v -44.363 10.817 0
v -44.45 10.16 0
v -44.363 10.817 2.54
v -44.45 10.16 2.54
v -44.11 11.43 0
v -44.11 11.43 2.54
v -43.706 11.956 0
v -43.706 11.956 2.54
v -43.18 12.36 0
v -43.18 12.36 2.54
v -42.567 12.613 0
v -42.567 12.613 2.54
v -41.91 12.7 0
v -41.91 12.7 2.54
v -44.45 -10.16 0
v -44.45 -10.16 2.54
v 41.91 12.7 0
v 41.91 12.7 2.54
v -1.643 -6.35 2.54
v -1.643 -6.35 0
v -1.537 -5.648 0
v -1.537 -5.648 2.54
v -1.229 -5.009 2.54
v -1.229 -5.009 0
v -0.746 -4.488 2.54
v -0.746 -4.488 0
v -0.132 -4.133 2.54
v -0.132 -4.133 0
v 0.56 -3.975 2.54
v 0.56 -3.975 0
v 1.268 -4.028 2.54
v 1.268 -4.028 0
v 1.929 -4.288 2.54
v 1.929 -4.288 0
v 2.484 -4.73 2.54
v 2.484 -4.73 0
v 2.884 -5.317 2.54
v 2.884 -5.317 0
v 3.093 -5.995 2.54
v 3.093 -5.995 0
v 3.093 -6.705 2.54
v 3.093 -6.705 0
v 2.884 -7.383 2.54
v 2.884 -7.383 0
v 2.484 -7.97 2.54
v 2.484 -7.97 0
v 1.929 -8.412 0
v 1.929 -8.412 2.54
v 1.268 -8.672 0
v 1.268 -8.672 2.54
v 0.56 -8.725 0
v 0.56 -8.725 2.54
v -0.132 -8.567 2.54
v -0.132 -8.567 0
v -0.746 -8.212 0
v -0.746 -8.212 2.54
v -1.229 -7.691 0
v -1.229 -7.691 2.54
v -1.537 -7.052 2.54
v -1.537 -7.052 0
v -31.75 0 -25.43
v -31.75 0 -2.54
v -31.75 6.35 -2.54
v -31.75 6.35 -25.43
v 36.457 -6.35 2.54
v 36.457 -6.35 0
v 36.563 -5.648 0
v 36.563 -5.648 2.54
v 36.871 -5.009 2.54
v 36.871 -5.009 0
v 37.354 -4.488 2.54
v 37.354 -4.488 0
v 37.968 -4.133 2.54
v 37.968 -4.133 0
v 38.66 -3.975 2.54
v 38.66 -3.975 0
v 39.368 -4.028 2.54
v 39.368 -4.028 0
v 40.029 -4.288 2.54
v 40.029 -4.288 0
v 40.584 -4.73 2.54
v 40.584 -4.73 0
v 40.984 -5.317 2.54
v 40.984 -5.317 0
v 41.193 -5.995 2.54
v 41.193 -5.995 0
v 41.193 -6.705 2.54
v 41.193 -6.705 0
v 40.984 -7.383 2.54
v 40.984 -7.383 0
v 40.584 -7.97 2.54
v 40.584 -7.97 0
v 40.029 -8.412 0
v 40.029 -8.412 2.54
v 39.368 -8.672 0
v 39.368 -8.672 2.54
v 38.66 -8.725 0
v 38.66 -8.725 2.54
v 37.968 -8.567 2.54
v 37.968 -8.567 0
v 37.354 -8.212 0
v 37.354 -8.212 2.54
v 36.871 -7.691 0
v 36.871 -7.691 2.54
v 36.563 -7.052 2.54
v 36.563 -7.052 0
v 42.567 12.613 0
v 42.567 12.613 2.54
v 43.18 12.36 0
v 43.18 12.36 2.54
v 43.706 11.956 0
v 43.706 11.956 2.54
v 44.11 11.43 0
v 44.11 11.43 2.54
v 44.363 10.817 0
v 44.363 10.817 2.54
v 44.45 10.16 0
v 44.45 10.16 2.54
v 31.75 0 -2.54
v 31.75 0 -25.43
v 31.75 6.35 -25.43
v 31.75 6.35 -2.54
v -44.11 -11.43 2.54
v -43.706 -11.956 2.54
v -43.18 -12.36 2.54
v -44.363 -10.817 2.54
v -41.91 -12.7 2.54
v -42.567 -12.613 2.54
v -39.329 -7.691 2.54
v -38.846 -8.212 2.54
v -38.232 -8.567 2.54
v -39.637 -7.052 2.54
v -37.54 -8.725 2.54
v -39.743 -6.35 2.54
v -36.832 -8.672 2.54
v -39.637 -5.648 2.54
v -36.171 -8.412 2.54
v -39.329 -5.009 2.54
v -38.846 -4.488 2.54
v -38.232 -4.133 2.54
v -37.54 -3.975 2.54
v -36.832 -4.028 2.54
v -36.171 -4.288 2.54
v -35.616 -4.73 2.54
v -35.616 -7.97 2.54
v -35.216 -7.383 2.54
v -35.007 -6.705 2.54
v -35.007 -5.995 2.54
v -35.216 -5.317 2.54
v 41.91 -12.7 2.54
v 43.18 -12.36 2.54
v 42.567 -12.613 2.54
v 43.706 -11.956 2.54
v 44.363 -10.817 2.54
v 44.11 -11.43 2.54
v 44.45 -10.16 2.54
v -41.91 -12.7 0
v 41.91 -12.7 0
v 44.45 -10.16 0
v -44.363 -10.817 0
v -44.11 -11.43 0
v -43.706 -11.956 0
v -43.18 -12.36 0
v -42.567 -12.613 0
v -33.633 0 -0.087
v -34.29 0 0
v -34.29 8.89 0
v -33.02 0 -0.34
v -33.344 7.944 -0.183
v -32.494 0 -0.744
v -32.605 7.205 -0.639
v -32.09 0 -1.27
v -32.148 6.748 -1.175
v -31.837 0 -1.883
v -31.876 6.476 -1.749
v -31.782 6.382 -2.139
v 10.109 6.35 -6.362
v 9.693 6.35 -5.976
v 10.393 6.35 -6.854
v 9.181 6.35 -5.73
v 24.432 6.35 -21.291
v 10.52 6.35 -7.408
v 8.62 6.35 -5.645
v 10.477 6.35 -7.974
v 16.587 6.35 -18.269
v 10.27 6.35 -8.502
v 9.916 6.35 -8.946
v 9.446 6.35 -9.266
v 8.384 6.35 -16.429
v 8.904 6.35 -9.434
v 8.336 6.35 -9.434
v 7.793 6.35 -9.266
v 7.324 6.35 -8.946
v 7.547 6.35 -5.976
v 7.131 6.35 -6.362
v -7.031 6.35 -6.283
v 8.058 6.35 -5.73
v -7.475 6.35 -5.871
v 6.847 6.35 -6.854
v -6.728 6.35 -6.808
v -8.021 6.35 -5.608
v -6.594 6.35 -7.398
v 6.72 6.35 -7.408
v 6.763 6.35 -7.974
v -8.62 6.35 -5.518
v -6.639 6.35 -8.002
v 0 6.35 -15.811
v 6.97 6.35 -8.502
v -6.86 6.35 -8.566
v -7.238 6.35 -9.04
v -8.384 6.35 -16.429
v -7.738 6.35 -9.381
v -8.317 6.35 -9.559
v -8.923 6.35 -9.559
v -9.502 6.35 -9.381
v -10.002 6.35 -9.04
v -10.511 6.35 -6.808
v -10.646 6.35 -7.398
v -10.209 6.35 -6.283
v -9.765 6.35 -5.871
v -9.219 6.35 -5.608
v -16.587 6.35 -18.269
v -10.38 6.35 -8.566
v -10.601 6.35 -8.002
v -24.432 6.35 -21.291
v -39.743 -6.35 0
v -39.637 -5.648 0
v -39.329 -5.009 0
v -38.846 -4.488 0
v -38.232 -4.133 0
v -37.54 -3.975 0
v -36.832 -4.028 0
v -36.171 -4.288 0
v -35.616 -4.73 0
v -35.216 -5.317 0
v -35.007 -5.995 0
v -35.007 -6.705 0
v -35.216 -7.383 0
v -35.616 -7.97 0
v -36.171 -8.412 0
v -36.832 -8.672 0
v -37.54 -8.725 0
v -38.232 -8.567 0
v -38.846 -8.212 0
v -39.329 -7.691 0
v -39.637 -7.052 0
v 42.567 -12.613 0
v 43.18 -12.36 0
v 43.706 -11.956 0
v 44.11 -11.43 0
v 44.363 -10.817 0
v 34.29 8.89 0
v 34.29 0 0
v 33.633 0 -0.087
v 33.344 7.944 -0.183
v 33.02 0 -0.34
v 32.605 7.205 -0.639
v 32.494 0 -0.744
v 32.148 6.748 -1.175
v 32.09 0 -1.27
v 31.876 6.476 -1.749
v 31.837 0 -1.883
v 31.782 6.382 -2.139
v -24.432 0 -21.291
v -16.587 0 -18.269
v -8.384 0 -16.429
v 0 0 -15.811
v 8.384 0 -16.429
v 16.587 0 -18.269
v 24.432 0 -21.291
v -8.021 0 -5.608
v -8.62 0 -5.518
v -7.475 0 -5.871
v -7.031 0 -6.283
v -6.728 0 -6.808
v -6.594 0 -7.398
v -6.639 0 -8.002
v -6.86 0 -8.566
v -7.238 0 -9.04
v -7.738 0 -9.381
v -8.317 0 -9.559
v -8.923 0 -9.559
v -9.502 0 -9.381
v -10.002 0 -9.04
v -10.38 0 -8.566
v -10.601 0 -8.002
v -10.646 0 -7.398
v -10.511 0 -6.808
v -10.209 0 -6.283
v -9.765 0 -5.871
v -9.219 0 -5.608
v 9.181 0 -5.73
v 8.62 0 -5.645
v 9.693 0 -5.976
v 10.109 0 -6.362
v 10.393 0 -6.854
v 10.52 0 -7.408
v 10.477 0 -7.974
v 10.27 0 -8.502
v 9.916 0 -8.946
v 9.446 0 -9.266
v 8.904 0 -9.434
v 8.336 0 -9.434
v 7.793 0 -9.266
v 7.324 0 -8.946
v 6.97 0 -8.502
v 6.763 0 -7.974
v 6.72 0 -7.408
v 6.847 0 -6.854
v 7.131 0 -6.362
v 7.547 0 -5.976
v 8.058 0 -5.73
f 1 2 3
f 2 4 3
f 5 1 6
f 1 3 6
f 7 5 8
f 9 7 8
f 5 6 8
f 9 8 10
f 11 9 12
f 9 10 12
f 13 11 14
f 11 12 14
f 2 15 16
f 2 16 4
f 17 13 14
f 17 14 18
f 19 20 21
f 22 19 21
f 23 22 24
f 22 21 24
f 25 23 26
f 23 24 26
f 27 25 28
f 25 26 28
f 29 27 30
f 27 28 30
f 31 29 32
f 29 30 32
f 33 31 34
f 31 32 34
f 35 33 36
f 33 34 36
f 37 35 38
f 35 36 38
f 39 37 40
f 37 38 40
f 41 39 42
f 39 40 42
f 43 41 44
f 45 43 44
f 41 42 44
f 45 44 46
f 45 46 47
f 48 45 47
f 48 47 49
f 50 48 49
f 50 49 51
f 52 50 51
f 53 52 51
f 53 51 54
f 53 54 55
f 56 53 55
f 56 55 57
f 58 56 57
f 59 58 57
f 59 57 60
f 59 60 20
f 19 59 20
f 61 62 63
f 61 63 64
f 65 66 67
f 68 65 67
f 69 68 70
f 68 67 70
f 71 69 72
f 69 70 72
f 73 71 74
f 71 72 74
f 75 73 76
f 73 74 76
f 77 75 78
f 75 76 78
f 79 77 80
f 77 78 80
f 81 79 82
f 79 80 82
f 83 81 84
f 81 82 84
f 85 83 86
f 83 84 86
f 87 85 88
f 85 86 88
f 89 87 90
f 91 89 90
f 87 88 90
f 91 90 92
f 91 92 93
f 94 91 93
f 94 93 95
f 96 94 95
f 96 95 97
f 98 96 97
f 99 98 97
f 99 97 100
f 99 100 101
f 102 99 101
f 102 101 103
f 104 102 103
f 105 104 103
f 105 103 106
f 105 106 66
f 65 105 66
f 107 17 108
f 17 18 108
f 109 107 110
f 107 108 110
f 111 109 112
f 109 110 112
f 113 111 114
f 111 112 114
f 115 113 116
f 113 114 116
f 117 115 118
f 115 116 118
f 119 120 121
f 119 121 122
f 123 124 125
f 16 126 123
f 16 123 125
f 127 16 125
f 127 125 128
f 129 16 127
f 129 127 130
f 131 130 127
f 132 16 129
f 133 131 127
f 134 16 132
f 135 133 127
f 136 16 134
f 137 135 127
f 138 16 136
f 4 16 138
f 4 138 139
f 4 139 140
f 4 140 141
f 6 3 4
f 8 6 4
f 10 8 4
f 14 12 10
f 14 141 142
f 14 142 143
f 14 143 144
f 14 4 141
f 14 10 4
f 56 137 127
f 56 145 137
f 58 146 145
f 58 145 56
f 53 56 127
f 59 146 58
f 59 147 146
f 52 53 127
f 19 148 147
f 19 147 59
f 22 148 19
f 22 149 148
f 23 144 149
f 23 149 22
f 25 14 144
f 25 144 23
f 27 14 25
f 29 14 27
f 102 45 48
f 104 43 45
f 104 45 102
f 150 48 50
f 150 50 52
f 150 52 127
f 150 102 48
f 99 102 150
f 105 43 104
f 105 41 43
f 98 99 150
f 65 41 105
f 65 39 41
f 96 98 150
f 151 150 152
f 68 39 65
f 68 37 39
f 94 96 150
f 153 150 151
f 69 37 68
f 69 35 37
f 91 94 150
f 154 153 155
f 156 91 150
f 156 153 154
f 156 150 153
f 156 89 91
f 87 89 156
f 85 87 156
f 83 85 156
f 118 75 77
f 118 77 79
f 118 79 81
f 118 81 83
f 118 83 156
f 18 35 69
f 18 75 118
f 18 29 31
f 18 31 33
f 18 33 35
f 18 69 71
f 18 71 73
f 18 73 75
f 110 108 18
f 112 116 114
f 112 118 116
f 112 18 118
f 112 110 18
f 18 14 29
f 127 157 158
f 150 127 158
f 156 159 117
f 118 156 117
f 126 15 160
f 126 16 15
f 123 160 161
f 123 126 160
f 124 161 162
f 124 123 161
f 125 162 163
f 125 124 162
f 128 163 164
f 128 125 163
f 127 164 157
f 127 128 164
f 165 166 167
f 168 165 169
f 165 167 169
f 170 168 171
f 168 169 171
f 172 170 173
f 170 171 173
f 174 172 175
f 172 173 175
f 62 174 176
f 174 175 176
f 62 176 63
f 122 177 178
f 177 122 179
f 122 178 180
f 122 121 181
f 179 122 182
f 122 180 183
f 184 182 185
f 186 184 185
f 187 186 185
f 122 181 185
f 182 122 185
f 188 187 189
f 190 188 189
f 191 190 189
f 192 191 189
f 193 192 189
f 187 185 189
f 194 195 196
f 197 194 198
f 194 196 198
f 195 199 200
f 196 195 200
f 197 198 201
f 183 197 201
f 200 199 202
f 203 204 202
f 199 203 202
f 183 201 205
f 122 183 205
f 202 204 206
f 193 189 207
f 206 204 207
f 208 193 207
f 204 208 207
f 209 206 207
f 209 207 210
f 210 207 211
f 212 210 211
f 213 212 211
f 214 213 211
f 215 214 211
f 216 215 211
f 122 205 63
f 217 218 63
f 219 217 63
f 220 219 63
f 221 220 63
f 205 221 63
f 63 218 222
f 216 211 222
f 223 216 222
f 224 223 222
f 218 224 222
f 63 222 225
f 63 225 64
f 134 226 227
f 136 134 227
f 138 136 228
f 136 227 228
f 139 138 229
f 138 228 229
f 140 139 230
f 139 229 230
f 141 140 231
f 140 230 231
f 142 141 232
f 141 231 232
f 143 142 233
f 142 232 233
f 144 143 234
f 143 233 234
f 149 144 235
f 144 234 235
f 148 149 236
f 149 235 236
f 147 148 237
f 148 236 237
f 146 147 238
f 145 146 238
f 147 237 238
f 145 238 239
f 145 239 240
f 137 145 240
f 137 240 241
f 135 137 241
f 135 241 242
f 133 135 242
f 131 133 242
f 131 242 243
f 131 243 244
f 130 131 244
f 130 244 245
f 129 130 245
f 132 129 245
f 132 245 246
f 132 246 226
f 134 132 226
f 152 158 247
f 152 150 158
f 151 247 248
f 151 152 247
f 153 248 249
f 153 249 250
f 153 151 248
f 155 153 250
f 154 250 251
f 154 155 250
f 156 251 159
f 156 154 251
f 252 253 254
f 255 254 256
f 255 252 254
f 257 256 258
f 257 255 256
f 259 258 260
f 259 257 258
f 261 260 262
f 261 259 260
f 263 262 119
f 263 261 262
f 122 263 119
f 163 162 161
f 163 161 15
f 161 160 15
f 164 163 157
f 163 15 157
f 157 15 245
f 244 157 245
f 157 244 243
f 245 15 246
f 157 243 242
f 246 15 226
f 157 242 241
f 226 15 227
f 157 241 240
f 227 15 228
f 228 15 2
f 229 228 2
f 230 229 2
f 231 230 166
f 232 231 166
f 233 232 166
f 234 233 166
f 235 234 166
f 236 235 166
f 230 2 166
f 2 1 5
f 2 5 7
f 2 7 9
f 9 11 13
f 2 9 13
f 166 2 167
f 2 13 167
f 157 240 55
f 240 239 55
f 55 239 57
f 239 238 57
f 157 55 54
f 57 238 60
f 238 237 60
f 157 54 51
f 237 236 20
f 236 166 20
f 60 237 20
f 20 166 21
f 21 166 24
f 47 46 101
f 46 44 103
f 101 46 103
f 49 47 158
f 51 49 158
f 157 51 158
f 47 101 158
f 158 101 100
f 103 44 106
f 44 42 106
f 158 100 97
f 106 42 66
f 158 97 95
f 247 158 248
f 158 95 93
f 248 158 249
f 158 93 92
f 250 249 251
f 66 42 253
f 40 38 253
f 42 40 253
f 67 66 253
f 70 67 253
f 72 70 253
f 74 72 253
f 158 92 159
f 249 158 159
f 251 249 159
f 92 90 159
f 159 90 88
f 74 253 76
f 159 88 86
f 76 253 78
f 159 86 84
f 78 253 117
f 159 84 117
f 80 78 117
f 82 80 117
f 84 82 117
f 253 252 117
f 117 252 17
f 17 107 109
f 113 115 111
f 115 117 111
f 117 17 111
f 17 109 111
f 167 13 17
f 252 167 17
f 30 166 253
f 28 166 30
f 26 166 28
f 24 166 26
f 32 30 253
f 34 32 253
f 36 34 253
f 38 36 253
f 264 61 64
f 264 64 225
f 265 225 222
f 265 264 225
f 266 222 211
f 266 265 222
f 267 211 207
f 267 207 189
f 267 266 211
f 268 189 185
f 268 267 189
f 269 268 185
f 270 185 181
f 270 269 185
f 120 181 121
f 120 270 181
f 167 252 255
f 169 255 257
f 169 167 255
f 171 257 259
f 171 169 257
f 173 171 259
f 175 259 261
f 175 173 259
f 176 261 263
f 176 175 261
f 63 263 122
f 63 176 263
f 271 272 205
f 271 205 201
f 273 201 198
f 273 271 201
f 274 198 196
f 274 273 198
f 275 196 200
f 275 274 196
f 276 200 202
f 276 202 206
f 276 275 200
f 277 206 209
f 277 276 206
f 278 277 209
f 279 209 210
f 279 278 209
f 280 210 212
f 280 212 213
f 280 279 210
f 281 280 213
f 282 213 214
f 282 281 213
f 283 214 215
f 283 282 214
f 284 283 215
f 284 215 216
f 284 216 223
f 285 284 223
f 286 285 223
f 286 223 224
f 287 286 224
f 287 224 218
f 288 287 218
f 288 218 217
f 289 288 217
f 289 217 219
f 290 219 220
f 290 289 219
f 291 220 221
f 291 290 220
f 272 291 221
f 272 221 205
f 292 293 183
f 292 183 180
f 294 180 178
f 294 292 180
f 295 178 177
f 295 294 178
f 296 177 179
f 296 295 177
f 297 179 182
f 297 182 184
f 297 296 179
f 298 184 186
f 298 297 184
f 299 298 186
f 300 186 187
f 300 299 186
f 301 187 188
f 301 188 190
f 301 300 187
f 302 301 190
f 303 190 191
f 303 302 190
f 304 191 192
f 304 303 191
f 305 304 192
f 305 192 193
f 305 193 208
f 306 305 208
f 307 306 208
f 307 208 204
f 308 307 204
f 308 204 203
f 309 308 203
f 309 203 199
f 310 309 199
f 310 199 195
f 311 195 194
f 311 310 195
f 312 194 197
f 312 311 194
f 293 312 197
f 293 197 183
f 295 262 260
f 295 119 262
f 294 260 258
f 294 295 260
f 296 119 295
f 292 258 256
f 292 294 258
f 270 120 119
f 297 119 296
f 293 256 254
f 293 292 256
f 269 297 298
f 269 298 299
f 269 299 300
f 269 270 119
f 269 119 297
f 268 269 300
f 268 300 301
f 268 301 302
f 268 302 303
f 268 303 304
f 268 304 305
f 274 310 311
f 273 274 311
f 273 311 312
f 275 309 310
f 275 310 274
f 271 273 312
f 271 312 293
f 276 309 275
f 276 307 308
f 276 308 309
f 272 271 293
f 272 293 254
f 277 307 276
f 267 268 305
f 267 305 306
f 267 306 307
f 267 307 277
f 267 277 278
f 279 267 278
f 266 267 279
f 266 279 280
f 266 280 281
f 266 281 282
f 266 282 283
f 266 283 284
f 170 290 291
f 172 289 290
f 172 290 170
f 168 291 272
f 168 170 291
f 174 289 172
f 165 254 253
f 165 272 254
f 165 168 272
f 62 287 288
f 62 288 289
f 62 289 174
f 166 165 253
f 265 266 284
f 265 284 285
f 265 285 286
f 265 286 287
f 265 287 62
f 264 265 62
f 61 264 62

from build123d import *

# Parameters (mm, degrees)
SKETCH1_W           = 88.9
SKETCH1_H           = 25.4
BOSS_EXTRUDE1_DEPTH = 2.54
SKETCH2_R           = 2.032
SKETCH2_R_2         = 1.905
BOSS_EXTRUDE2_DEPTH = 6.35
SKETCH3_R           = 2.38125
CUT_EXTRUDE1_DEPTH  = 53.761321688
FILLET1_R           = 2.54


with BuildPart() as part:
    # Sketch1 → Boss-Extrude1 (new body)
    with BuildSketch(Plane.XY):
        Rectangle(SKETCH1_W, SKETCH1_H)
    extrude(amount=BOSS_EXTRUDE1_DEPTH)

    # Sketch2 → Boss-Extrude2 (add)
    with BuildSketch(Plane(origin=(0, 0, 0), x_dir=(1, 0, 0), z_dir=(0, 1, 0))):
        with BuildLine():
            Line((-31.75, 0), (-31.75, 25.429600199))
            ThreePointArc((-31.75, 25.429600199), (0, 15.8115), (31.75, 25.429600199))
            Line((31.75, 25.429600199), (31.75, 0))
            Line((31.75, 0), (0, 0))
            Line((0, 0), (-31.75, 0))
        make_face()
        with Locations(Location((-8.619949734, 7.549981355, 0), (0, 0, 270))):
            Circle(SKETCH2_R, mode=Mode.SUBTRACT)
        with Locations(Location((8.619949734, 7.549981355, 0), (0, 0, 270))):
            Circle(SKETCH2_R_2, mode=Mode.SUBTRACT)
    extrude(amount=BOSS_EXTRUDE2_DEPTH)

    # Sketch3 → Cut-Extrude1 (cut, through all)
    with BuildSketch(Plane(origin=(0, 0, 0), x_dir=(-1, 0, 0), z_dir=(0, 0, -1))):
        with Locations((-38.838399738, -6.35)):
            Circle(SKETCH3_R)
        with Locations((-0.738399738, -6.35)):
            Circle(SKETCH3_R)
        with Locations((37.361600262, -6.35)):
            Circle(SKETCH3_R)
    extrude(amount=-CUT_EXTRUDE1_DEPTH, mode=Mode.SUBTRACT)

    # Fillet1
    fillet1_edges = [part.edges().sort_by_distance(p)[0] for p in [
        (0, 6.35, 0),
        (31.75, 3.175, 0),
        (-31.75, 3.175, 0),
        (44.45, -12.7, 1.27),
        (-44.45, -12.7, 1.27),
        (-44.45, 12.7, 1.27),
        (44.45, 12.7, 1.27),
    ]]
    fillet(fillet1_edges, radius=FILLET1_R)


solid = part.part
